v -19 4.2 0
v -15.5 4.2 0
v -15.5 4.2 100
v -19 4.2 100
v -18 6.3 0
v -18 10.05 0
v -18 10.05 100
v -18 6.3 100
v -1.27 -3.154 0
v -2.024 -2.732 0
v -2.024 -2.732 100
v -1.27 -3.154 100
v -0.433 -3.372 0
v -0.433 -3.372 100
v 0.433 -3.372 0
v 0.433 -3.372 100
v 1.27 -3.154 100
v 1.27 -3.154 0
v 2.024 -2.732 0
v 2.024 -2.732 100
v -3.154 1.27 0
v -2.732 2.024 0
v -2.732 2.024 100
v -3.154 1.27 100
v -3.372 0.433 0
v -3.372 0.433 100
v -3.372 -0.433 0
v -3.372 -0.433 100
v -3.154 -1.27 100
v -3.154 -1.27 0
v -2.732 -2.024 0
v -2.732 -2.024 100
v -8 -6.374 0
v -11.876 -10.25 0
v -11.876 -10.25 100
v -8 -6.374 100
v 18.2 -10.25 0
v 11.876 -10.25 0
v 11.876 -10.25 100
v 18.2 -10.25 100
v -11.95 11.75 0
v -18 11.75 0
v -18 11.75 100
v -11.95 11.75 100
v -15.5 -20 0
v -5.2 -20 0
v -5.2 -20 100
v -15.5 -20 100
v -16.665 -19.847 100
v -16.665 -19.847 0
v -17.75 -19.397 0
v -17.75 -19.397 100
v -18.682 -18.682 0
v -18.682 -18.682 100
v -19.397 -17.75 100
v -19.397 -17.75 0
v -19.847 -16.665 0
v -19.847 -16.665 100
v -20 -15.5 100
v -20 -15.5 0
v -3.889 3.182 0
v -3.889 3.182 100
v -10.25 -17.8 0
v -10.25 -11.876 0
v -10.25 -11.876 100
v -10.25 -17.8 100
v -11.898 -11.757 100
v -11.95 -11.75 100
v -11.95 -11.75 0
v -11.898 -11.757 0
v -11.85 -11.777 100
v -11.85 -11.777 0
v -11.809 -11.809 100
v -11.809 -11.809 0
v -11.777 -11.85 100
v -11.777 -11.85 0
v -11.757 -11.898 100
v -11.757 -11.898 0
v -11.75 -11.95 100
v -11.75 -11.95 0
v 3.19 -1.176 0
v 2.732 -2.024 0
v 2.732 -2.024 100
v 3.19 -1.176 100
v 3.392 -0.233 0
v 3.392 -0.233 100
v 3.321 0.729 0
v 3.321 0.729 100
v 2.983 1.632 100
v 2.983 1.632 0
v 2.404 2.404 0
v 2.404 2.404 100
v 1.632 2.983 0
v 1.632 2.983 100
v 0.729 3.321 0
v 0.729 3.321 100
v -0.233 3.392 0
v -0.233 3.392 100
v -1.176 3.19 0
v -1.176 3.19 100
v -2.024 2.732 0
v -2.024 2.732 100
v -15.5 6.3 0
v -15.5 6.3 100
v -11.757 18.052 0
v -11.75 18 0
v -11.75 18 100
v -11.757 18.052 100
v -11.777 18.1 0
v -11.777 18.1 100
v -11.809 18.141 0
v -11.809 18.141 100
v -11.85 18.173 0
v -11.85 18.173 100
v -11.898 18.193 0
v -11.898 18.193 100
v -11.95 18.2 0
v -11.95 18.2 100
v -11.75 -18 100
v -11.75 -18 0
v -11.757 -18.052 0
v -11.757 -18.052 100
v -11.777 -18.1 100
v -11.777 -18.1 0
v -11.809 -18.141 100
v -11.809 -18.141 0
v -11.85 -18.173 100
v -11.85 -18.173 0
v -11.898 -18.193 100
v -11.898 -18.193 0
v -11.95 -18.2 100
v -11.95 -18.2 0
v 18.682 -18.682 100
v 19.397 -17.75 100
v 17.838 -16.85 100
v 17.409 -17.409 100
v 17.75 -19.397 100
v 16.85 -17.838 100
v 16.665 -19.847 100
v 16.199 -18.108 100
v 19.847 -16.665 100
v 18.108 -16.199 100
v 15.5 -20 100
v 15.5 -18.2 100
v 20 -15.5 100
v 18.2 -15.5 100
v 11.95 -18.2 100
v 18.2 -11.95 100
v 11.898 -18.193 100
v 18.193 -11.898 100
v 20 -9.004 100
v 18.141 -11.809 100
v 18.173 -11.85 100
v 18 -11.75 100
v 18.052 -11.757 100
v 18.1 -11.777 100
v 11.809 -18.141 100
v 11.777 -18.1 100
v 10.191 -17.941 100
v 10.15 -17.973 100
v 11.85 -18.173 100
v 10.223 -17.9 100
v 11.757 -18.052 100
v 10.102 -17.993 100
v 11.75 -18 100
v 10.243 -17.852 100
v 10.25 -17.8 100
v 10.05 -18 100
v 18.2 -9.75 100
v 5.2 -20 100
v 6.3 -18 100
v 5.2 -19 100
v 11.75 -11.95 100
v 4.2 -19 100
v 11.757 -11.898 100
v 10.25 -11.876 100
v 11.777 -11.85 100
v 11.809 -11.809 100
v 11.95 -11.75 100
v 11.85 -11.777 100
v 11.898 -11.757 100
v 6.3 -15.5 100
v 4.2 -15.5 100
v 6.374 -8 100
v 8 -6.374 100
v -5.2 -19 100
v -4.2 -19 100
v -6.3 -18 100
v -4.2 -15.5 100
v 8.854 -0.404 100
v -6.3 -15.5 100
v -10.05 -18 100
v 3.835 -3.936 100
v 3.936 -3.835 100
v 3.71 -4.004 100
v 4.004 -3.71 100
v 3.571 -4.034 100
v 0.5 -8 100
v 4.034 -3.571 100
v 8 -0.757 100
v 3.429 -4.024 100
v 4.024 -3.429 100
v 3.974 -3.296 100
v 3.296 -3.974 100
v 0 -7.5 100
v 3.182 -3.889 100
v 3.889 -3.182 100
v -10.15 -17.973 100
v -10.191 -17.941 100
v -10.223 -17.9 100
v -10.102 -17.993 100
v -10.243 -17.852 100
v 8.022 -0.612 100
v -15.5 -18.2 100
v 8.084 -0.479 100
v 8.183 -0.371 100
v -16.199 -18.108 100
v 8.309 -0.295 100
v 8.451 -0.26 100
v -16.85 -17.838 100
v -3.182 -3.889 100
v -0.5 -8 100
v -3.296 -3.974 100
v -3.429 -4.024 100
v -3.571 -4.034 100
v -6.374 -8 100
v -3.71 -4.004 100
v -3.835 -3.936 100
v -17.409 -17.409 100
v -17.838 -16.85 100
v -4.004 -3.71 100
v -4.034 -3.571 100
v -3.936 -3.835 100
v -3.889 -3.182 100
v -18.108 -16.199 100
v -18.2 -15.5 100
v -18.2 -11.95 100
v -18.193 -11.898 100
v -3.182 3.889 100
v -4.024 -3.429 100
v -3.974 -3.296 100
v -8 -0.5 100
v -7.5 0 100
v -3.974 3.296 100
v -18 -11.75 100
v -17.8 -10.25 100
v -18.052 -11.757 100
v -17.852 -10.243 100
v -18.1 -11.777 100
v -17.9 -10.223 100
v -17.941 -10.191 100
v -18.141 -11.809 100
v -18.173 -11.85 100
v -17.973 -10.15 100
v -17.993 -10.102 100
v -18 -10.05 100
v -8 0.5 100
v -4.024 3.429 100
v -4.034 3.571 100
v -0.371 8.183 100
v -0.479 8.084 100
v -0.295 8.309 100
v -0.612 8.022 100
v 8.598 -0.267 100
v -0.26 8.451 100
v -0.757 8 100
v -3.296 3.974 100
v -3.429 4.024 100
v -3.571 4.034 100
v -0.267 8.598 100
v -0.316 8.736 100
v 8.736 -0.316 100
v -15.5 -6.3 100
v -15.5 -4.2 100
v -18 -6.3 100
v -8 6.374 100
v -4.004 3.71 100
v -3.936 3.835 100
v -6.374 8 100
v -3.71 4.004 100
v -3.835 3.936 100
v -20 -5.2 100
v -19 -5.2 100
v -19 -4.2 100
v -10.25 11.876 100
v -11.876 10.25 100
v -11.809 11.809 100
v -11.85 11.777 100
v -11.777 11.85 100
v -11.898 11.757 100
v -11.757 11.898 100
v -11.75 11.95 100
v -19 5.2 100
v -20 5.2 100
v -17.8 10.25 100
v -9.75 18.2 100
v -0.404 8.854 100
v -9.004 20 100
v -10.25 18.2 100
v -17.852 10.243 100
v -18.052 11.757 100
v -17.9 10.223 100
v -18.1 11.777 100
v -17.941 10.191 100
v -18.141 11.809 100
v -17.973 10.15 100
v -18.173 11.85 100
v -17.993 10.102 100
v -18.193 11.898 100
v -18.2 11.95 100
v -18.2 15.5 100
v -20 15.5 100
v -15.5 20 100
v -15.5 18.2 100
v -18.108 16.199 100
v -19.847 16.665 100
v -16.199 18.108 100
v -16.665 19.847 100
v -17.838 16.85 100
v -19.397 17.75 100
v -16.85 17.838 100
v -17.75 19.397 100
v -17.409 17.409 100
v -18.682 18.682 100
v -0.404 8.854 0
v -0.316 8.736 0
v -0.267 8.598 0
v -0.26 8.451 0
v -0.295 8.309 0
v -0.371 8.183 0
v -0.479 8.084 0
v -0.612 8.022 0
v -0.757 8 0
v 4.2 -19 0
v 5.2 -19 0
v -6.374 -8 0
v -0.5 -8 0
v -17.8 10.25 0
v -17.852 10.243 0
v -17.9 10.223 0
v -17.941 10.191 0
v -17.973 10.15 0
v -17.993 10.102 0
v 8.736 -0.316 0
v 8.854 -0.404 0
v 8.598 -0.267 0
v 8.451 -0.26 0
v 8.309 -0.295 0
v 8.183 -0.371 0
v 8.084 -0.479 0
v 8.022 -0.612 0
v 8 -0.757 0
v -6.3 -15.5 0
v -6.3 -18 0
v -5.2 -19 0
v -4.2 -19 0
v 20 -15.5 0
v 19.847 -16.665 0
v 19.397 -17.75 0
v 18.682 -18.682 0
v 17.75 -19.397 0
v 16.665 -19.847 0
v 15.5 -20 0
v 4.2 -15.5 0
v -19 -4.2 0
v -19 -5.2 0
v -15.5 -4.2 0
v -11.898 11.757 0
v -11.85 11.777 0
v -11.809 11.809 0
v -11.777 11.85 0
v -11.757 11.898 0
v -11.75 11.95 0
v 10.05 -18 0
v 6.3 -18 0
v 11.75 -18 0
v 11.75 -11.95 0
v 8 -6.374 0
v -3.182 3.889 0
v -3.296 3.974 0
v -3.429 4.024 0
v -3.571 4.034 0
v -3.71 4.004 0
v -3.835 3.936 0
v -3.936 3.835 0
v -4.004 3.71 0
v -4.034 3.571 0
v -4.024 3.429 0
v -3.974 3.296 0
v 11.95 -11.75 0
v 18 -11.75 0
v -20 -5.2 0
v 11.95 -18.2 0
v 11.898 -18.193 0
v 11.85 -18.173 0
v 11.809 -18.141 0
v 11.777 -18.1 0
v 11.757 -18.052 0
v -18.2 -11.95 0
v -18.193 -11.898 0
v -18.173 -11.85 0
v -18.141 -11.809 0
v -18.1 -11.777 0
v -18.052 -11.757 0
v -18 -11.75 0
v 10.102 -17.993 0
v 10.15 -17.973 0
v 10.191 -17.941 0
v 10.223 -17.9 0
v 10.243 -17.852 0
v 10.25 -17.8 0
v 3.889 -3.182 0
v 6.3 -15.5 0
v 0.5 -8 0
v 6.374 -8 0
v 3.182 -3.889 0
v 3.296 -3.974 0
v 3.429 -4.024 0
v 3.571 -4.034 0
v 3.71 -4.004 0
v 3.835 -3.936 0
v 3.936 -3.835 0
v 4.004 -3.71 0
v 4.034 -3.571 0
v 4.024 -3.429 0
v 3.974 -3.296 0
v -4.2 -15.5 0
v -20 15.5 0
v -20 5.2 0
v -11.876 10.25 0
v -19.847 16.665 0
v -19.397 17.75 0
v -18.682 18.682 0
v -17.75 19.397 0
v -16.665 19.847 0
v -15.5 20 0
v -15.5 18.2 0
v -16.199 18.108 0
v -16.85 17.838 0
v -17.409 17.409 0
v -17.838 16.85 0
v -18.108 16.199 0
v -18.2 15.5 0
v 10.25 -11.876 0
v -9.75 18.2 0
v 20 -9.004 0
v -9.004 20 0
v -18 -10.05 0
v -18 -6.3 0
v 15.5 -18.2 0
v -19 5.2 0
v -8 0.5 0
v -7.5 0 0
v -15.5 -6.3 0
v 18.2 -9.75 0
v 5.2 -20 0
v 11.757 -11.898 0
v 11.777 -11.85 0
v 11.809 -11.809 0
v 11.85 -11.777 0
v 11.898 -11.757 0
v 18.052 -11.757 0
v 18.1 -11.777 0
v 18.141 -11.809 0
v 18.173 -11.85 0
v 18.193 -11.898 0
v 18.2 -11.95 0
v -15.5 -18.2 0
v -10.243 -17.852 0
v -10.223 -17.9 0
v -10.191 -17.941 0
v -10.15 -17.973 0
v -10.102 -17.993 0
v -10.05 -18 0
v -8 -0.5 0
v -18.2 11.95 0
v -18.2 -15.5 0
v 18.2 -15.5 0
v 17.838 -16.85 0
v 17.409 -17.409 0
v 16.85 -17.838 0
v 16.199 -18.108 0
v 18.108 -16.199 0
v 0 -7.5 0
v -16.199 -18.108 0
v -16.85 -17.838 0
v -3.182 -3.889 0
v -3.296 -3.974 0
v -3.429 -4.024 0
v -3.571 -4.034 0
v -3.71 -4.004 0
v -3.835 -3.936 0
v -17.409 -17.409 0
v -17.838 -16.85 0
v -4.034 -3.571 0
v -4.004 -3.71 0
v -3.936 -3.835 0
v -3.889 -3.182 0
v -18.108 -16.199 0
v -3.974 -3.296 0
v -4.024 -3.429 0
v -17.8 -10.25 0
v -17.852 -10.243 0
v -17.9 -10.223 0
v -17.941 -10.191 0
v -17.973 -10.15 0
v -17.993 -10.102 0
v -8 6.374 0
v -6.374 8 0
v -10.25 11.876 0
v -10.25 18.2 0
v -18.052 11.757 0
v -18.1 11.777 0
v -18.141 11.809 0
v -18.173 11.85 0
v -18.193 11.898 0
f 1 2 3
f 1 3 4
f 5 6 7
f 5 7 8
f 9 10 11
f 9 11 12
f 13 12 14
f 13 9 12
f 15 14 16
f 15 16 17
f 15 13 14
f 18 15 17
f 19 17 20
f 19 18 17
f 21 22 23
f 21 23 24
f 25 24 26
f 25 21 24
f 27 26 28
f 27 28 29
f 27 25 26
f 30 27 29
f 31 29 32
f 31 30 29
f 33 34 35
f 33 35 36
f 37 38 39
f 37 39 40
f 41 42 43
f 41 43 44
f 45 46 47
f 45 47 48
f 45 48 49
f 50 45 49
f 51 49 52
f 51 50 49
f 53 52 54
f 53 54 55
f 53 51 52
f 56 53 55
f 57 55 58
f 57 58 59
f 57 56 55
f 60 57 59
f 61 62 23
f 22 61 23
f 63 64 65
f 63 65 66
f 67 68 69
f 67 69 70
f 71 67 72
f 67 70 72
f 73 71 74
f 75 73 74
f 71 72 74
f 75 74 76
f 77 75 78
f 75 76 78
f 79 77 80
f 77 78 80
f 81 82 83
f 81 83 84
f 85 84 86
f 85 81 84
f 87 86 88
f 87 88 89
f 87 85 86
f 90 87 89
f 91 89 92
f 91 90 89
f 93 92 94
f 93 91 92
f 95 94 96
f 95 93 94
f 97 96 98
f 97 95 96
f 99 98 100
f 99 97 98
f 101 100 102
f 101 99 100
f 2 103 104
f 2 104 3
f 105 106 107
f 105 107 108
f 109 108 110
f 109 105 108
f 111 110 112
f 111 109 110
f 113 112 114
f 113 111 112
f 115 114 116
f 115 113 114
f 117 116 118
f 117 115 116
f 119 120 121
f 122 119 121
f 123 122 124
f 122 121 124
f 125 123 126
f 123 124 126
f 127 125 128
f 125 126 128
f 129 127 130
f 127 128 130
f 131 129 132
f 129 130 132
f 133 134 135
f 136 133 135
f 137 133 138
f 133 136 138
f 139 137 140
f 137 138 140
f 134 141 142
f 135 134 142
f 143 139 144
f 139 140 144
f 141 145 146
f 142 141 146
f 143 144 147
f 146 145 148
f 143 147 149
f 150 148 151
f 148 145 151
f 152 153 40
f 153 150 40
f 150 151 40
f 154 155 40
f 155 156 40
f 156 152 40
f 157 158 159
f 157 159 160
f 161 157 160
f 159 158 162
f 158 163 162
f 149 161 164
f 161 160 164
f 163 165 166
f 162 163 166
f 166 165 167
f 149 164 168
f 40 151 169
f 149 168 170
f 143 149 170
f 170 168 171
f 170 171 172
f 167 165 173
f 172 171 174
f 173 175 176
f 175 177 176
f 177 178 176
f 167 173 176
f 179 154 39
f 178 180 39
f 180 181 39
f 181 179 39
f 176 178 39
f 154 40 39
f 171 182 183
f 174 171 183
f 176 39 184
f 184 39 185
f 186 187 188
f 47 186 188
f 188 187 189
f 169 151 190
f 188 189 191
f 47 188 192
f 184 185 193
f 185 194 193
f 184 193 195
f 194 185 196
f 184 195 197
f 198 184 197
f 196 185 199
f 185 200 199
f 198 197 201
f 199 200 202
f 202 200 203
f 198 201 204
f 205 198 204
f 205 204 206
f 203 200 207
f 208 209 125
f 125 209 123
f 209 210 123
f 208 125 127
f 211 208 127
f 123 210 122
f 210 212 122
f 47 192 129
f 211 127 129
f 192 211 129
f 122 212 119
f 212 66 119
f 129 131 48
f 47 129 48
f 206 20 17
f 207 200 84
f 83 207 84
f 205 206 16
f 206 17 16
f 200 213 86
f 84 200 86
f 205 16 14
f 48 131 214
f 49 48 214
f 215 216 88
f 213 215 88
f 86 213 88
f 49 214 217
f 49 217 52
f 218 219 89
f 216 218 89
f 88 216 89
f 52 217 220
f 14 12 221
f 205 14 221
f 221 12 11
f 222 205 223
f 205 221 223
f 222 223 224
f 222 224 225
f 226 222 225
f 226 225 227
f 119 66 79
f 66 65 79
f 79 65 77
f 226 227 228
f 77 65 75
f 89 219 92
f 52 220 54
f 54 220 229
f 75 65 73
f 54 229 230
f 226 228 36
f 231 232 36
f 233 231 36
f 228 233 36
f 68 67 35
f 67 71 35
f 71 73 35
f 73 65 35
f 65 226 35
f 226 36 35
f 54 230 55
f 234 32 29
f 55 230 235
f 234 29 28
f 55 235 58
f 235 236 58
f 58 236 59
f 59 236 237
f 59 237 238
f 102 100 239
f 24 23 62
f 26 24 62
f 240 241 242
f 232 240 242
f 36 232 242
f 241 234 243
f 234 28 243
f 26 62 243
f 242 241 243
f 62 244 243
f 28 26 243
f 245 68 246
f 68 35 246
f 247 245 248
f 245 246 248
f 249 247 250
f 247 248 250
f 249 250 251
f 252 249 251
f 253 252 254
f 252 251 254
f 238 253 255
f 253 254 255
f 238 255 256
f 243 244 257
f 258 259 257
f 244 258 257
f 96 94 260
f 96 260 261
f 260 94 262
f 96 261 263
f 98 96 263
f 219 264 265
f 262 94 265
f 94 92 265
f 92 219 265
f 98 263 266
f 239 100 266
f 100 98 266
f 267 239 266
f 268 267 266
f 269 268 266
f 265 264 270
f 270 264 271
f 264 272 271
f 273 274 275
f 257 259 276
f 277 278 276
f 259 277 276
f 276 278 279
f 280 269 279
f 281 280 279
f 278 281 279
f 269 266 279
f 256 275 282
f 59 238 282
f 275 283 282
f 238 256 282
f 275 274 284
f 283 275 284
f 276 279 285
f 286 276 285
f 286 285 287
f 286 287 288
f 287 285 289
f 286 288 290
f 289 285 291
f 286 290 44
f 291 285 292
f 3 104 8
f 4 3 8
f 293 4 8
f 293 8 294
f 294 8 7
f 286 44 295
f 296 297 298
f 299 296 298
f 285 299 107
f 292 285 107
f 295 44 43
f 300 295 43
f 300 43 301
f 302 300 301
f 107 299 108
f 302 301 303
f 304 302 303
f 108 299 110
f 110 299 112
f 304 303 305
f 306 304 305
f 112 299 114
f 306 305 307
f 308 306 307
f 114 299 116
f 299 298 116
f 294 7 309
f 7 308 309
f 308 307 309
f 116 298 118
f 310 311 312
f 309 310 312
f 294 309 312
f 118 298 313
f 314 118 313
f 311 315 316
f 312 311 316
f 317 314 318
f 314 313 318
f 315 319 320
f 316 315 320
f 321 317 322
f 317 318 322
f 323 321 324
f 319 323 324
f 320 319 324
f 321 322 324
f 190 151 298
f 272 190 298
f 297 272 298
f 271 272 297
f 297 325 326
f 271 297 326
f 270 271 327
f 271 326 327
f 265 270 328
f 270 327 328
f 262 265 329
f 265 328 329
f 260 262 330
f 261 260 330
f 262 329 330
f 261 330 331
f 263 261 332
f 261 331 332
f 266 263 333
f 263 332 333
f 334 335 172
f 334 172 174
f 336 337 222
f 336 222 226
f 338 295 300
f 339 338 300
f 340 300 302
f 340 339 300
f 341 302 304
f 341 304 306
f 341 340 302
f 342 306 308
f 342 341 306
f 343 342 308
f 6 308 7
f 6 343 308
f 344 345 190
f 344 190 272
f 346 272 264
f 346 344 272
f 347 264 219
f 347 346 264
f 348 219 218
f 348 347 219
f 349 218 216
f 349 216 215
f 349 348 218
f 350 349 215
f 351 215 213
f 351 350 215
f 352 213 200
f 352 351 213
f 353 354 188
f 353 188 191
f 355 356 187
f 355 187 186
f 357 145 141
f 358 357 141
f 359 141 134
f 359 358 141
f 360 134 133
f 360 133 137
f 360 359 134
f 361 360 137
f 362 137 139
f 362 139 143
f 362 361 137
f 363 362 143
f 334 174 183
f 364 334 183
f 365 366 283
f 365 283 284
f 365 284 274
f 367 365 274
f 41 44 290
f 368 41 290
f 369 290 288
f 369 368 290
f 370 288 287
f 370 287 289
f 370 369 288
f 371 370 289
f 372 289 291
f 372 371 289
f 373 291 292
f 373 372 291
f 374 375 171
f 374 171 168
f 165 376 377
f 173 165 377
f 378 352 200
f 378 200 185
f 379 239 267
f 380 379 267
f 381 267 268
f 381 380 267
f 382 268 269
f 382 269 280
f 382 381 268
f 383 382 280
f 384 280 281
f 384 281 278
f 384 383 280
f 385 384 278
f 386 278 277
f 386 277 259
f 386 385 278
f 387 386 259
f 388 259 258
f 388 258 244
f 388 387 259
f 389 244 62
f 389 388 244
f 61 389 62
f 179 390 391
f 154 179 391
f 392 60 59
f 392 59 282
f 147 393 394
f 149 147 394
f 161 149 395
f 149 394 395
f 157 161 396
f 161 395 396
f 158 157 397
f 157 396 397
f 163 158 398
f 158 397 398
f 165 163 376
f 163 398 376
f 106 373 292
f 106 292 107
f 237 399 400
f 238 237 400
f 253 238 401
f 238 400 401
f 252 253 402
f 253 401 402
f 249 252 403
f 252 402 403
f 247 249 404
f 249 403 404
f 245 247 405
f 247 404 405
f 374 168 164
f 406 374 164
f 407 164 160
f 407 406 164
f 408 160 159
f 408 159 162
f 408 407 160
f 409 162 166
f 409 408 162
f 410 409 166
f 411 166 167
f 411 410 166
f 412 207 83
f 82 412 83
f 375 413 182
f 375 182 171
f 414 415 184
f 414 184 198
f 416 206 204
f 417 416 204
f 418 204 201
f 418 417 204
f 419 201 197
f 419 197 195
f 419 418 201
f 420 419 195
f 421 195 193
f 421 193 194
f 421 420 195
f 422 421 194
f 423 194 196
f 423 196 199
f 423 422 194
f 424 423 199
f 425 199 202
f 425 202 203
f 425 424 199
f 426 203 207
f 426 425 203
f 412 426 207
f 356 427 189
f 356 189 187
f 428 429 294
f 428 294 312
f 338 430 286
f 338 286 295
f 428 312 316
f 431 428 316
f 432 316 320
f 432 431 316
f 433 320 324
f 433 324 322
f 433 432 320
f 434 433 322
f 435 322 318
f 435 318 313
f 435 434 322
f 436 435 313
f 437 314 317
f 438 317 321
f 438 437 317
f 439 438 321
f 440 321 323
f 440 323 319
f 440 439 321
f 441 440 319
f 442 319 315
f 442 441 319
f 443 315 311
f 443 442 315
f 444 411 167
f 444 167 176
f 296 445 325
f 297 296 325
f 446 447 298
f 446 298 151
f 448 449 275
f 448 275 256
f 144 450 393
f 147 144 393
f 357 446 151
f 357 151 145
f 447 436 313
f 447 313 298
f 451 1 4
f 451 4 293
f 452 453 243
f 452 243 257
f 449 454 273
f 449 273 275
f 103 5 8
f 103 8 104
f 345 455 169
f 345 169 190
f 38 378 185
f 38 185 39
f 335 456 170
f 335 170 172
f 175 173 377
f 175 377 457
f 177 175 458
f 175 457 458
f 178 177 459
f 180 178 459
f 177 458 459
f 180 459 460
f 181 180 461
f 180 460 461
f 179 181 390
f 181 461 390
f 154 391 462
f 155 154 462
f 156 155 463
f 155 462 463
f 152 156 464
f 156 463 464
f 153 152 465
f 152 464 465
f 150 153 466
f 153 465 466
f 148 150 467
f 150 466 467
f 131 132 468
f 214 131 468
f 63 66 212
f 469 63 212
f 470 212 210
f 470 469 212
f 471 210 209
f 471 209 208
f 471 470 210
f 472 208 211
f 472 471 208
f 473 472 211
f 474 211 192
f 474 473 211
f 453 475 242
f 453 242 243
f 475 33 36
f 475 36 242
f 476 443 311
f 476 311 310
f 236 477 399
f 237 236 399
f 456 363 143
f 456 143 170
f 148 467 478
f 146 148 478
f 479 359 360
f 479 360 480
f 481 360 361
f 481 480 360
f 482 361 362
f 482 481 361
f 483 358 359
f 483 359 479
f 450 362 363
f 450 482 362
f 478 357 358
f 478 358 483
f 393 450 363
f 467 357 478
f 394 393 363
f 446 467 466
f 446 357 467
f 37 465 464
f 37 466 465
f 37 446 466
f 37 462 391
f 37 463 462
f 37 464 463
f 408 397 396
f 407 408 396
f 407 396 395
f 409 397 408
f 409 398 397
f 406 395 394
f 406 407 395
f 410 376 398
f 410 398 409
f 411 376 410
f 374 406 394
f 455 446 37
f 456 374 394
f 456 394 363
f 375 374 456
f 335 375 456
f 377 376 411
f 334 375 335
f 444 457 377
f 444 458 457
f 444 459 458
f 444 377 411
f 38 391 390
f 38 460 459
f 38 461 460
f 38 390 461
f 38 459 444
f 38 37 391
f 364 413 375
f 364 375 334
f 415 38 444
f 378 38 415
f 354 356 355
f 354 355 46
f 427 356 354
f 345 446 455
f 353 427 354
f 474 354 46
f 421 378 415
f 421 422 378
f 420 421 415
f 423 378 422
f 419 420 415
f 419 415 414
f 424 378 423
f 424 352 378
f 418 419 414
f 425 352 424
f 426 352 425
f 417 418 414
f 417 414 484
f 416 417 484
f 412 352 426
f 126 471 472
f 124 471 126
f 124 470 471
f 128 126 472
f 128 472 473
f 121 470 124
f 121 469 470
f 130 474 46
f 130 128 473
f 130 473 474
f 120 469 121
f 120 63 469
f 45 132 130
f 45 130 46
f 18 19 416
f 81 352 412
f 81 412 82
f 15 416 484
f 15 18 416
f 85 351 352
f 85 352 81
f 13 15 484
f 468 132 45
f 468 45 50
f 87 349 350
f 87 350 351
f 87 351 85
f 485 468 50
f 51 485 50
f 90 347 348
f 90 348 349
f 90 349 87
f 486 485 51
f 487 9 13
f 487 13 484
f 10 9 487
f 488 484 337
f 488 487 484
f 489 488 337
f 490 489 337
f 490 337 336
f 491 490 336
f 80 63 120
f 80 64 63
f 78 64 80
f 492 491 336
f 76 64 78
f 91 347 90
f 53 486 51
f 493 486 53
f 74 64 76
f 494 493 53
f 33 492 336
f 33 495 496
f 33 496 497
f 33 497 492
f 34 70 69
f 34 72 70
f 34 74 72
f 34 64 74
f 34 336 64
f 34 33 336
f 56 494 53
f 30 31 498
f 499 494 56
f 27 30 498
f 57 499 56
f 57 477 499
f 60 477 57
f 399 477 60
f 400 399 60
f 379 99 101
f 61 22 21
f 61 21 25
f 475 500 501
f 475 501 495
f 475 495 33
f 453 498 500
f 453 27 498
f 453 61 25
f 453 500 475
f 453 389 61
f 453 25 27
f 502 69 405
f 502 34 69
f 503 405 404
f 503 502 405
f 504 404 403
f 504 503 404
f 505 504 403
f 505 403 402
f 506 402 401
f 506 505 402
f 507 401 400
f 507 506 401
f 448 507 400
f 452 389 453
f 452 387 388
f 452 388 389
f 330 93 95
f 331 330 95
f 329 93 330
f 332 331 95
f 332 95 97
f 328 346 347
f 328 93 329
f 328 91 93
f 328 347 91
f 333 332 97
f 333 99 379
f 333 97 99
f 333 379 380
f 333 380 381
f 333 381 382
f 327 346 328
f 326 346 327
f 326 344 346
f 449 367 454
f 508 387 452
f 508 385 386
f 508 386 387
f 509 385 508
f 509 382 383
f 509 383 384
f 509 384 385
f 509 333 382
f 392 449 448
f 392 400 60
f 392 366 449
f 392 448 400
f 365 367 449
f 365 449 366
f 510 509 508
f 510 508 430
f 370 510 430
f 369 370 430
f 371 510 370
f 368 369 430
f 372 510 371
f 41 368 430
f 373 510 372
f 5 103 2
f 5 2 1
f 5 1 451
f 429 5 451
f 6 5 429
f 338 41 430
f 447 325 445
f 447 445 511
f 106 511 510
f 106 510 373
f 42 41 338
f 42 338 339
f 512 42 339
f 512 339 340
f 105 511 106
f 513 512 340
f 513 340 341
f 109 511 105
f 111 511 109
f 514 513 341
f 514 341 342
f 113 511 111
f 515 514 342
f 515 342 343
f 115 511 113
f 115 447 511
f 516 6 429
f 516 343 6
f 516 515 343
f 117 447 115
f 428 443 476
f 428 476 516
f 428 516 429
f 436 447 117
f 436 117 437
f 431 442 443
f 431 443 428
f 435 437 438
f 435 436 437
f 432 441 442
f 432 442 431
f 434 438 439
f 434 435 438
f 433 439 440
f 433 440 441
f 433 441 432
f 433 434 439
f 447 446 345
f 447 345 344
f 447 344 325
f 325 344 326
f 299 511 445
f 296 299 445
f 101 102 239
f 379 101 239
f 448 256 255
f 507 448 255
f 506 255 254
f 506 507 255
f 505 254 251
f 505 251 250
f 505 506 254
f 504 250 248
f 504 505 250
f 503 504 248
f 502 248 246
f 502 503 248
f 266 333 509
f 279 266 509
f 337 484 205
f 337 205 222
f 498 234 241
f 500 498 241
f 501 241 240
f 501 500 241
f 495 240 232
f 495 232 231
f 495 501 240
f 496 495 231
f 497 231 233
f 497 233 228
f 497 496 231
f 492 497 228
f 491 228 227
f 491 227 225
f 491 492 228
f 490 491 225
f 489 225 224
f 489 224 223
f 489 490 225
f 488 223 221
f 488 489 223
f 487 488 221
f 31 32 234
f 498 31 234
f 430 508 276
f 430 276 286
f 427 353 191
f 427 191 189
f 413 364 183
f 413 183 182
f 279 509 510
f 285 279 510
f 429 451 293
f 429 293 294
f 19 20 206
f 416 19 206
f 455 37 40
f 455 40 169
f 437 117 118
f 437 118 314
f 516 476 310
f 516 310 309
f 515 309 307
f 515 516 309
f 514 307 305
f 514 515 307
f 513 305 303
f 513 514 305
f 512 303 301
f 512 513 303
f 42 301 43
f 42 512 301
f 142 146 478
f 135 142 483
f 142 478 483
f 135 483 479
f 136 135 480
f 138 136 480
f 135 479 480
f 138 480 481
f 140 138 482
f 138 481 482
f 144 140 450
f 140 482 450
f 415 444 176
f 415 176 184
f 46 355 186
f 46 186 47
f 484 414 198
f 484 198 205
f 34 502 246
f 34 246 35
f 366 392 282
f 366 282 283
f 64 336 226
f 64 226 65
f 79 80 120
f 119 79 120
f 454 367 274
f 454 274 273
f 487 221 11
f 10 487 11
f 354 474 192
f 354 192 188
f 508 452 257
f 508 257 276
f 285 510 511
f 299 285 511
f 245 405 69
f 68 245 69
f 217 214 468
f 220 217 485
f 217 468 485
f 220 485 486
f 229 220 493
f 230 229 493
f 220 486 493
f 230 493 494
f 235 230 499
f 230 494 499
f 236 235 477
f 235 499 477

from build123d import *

# Parameters (mm, degrees)
EXTRUDE_1_DEPTH = 100


with BuildPart() as part:
    # 草图1 → 凸台-拉伸1 (new body)
    with BuildSketch(Plane.XY):
        with BuildLine():
            Line((-20, -15.5), (-20, -5.2))
            Line((-20, -5.2), (-19, -5.2))
            Line((-19, -5.2), (-19, -4.2))
            Line((-19, -4.2), (-15.5, -4.2))
            Line((-15.5, -4.2), (-15.5, -6.3))
            Line((-15.5, -6.3), (-18, -6.3))
            Line((-18, -6.3), (-18, -10.05))
            ThreePointArc((-18, -10.05), (-17.941421356, -10.191421356), (-17.8, -10.25))
            Line((-17.8, -10.25), (-11.876345597, -10.25))
            Line((-11.876345597, -10.25), (-8, -6.373654403))
            Line((-8, -6.373654403), (-8, -0.5))
            Line((-8, -0.5), (-7.5, 0))
            Line((-7.5, 0), (-8, 0.5))
            Line((-8, 0.5), (-8, 6.373654403))
            Line((-8, 6.373654403), (-11.876345597, 10.25))
            Line((-11.876345597, 10.25), (-17.8, 10.25))
            ThreePointArc((-17.8, 10.25), (-17.941421356, 10.191421356), (-18, 10.05))
            Line((-18, 10.05), (-18, 6.3))
            Line((-18, 6.3), (-15.5, 6.3))
            Line((-15.5, 6.3), (-15.5, 4.2))
            Line((-15.5, 4.2), (-19, 4.2))
            Line((-19, 4.2), (-19, 5.2))
            Line((-19, 5.2), (-20, 5.2))
            Line((-20, 5.2), (-20, 15.5))
            ThreePointArc((-20, 15.5), (-18.681980515, 18.681980515), (-15.5, 20))
            Line((-15.5, 20), (-9.004415588, 20))
            Line((-9.004415588, 20), (20, -9.004415588))
            Line((20, -9.004415588), (20, -15.5))
            ThreePointArc((20, -15.5), (18.681980515, -18.681980515), (15.5, -20))
            Line((15.5, -20), (5.2, -20))
            Line((5.2, -20), (5.2, -19))
            Line((5.2, -19), (4.2, -19))
            Line((4.2, -19), (4.2, -15.5))
            Line((4.2, -15.5), (6.3, -15.5))
            Line((6.3, -15.5), (6.3, -18))
            Line((6.3, -18), (10.05, -18))
            ThreePointArc((10.05, -18), (10.191421356, -17.941421356), (10.25, -17.8))
            Line((10.25, -17.8), (10.25, -11.876345597))
            Line((10.25, -11.876345597), (6.373654403, -8))
            Line((6.373654403, -8), (0.5, -8))
            Line((0.5, -8), (0, -7.5))
            Line((0, -7.5), (-0.5, -8))
            Line((-0.5, -8), (-6.373654403, -8))
            Line((-6.373654403, -8), (-10.25, -11.876345597))
            Line((-10.25, -11.876345597), (-10.25, -17.8))
            ThreePointArc((-10.25, -17.8), (-10.191421356, -17.941421356), (-10.05, -18))
            Line((-10.05, -18), (-6.3, -18))
            Line((-6.3, -18), (-6.3, -15.5))
            Line((-6.3, -15.5), (-4.2, -15.5))
            Line((-4.2, -15.5), (-4.2, -19))
            Line((-4.2, -19), (-5.2, -19))
            Line((-5.2, -19), (-5.2, -20))
            Line((-5.2, -20), (-15.5, -20))
            ThreePointArc((-15.5, -20), (-18.681980515, -18.681980515), (-20, -15.5))
        make_face()
        with BuildLine():
            Line((-18.2, -15.5), (-18.2, -11.95))
            ThreePointArc((-18.2, -11.95), (-18.141421356, -11.808578644), (-18, -11.75))
            Line((-18, -11.75), (-11.95, -11.75))
            ThreePointArc((-11.95, -11.75), (-11.808578644, -11.808578644), (-11.75, -11.95))
            Line((-11.75, -11.95), (-11.75, -18))
            ThreePointArc((-11.75, -18), (-11.808578644, -18.141421356), (-11.95, -18.2))
            Line((-11.95, -18.2), (-15.5, -18.2))
            ThreePointArc((-15.5, -18.2), (-17.409188309, -17.409188309), (-18.2, -15.5))
        make_face(mode=Mode.SUBTRACT)
        with BuildLine():
            Line((-18.2, 15.5), (-18.2, 11.95))
            ThreePointArc((-18.2, 11.95), (-18.141421356, 11.808578644), (-18, 11.75))
            Line((-18, 11.75), (-11.95, 11.75))
            ThreePointArc((-11.95, 11.75), (-11.808578644, 11.808578644), (-11.75, 11.95))
            Line((-11.75, 11.95), (-11.75, 18))
            ThreePointArc((-11.75, 18), (-11.808578644, 18.141421356), (-11.95, 18.2))
            Line((-11.95, 18.2), (-15.5, 18.2))
            ThreePointArc((-15.5, 18.2), (-17.409188309, 17.409188309), (-18.2, 15.5))
        make_face(mode=Mode.SUBTRACT)
        with BuildLine():
            Line((-6.373654403, 8), (-10.25, 11.876345597))
            Line((-10.25, 11.876345597), (-10.25, 18.2))
            Line((-10.25, 18.2), (-9.75, 18.2))
            Line((-9.75, 18.2), (-0.403553391, 8.853553391))
            ThreePointArc((-0.403553391, 8.853553391), (-0.295167015, 8.308658284), (-0.757106781, 8))
            Line((-0.757106781, 8), (-6.373654403, 8))
        make_face(mode=Mode.SUBTRACT)
        with BuildLine():
            Line((8, -6.373654403), (11.876345597, -10.25))
            Line((11.876345597, -10.25), (18.2, -10.25))
            Line((18.2, -10.25), (18.2, -9.75))
            Line((18.2, -9.75), (8.853553391, -0.403553391))
            ThreePointArc((8.853553391, -0.403553391), (8.308658284, -0.295167015), (8, -0.757106781))
            Line((8, -0.757106781), (8, -6.373654403))
        make_face(mode=Mode.SUBTRACT)
        with BuildLine():
            Line((-3.181980515, -3.889087297), (-2.024471, -2.731577781))
            ThreePointArc((-2.024471, -2.731577781), (0, -3.4), (2.024471, -2.731577781))
            Line((2.024471, -2.731577781), (3.181980515, -3.889087297))
            ThreePointArc((3.181980515, -3.889087297), (3.889087297, -3.889087297), (3.889087297, -3.181980515))
            Line((3.889087297, -3.181980515), (2.731577781, -2.024471))
            ThreePointArc((2.731577781, -2.024471), (2.404163056, 2.404163056), (-2.024471, 2.731577781))
            Line((-2.024471, 2.731577781), (-3.181980515, 3.889087297))
            ThreePointArc((-3.181980515, 3.889087297), (-3.889087297, 3.889087297), (-3.889087297, 3.181980515))
            Line((-3.889087297, 3.181980515), (-2.731577781, 2.024471))
            ThreePointArc((-2.731577781, 2.024471), (-3.4, 0), (-2.731577781, -2.024471))
            Line((-2.731577781, -2.024471), (-3.889087297, -3.181980515))
            ThreePointArc((-3.889087297, -3.181980515), (-3.889087297, -3.889087297), (-3.181980515, -3.889087297))
        make_face(mode=Mode.SUBTRACT)
        with BuildLine():
            Line((15.5, -18.2), (11.95, -18.2))
            ThreePointArc((11.95, -18.2), (11.808578644, -18.141421356), (11.75, -18))
            Line((11.75, -18), (11.75, -11.95))
            ThreePointArc((11.75, -11.95), (11.808578644, -11.808578644), (11.95, -11.75))
            Line((11.95, -11.75), (18, -11.75))
            ThreePointArc((18, -11.75), (18.141421356, -11.808578644), (18.2, -11.95))
            Line((18.2, -11.95), (18.2, -15.5))
            ThreePointArc((18.2, -15.5), (17.409188309, -17.409188309), (15.5, -18.2))
        make_face(mode=Mode.SUBTRACT)
    extrude(amount=EXTRUDE_1_DEPTH)


solid = part.part
